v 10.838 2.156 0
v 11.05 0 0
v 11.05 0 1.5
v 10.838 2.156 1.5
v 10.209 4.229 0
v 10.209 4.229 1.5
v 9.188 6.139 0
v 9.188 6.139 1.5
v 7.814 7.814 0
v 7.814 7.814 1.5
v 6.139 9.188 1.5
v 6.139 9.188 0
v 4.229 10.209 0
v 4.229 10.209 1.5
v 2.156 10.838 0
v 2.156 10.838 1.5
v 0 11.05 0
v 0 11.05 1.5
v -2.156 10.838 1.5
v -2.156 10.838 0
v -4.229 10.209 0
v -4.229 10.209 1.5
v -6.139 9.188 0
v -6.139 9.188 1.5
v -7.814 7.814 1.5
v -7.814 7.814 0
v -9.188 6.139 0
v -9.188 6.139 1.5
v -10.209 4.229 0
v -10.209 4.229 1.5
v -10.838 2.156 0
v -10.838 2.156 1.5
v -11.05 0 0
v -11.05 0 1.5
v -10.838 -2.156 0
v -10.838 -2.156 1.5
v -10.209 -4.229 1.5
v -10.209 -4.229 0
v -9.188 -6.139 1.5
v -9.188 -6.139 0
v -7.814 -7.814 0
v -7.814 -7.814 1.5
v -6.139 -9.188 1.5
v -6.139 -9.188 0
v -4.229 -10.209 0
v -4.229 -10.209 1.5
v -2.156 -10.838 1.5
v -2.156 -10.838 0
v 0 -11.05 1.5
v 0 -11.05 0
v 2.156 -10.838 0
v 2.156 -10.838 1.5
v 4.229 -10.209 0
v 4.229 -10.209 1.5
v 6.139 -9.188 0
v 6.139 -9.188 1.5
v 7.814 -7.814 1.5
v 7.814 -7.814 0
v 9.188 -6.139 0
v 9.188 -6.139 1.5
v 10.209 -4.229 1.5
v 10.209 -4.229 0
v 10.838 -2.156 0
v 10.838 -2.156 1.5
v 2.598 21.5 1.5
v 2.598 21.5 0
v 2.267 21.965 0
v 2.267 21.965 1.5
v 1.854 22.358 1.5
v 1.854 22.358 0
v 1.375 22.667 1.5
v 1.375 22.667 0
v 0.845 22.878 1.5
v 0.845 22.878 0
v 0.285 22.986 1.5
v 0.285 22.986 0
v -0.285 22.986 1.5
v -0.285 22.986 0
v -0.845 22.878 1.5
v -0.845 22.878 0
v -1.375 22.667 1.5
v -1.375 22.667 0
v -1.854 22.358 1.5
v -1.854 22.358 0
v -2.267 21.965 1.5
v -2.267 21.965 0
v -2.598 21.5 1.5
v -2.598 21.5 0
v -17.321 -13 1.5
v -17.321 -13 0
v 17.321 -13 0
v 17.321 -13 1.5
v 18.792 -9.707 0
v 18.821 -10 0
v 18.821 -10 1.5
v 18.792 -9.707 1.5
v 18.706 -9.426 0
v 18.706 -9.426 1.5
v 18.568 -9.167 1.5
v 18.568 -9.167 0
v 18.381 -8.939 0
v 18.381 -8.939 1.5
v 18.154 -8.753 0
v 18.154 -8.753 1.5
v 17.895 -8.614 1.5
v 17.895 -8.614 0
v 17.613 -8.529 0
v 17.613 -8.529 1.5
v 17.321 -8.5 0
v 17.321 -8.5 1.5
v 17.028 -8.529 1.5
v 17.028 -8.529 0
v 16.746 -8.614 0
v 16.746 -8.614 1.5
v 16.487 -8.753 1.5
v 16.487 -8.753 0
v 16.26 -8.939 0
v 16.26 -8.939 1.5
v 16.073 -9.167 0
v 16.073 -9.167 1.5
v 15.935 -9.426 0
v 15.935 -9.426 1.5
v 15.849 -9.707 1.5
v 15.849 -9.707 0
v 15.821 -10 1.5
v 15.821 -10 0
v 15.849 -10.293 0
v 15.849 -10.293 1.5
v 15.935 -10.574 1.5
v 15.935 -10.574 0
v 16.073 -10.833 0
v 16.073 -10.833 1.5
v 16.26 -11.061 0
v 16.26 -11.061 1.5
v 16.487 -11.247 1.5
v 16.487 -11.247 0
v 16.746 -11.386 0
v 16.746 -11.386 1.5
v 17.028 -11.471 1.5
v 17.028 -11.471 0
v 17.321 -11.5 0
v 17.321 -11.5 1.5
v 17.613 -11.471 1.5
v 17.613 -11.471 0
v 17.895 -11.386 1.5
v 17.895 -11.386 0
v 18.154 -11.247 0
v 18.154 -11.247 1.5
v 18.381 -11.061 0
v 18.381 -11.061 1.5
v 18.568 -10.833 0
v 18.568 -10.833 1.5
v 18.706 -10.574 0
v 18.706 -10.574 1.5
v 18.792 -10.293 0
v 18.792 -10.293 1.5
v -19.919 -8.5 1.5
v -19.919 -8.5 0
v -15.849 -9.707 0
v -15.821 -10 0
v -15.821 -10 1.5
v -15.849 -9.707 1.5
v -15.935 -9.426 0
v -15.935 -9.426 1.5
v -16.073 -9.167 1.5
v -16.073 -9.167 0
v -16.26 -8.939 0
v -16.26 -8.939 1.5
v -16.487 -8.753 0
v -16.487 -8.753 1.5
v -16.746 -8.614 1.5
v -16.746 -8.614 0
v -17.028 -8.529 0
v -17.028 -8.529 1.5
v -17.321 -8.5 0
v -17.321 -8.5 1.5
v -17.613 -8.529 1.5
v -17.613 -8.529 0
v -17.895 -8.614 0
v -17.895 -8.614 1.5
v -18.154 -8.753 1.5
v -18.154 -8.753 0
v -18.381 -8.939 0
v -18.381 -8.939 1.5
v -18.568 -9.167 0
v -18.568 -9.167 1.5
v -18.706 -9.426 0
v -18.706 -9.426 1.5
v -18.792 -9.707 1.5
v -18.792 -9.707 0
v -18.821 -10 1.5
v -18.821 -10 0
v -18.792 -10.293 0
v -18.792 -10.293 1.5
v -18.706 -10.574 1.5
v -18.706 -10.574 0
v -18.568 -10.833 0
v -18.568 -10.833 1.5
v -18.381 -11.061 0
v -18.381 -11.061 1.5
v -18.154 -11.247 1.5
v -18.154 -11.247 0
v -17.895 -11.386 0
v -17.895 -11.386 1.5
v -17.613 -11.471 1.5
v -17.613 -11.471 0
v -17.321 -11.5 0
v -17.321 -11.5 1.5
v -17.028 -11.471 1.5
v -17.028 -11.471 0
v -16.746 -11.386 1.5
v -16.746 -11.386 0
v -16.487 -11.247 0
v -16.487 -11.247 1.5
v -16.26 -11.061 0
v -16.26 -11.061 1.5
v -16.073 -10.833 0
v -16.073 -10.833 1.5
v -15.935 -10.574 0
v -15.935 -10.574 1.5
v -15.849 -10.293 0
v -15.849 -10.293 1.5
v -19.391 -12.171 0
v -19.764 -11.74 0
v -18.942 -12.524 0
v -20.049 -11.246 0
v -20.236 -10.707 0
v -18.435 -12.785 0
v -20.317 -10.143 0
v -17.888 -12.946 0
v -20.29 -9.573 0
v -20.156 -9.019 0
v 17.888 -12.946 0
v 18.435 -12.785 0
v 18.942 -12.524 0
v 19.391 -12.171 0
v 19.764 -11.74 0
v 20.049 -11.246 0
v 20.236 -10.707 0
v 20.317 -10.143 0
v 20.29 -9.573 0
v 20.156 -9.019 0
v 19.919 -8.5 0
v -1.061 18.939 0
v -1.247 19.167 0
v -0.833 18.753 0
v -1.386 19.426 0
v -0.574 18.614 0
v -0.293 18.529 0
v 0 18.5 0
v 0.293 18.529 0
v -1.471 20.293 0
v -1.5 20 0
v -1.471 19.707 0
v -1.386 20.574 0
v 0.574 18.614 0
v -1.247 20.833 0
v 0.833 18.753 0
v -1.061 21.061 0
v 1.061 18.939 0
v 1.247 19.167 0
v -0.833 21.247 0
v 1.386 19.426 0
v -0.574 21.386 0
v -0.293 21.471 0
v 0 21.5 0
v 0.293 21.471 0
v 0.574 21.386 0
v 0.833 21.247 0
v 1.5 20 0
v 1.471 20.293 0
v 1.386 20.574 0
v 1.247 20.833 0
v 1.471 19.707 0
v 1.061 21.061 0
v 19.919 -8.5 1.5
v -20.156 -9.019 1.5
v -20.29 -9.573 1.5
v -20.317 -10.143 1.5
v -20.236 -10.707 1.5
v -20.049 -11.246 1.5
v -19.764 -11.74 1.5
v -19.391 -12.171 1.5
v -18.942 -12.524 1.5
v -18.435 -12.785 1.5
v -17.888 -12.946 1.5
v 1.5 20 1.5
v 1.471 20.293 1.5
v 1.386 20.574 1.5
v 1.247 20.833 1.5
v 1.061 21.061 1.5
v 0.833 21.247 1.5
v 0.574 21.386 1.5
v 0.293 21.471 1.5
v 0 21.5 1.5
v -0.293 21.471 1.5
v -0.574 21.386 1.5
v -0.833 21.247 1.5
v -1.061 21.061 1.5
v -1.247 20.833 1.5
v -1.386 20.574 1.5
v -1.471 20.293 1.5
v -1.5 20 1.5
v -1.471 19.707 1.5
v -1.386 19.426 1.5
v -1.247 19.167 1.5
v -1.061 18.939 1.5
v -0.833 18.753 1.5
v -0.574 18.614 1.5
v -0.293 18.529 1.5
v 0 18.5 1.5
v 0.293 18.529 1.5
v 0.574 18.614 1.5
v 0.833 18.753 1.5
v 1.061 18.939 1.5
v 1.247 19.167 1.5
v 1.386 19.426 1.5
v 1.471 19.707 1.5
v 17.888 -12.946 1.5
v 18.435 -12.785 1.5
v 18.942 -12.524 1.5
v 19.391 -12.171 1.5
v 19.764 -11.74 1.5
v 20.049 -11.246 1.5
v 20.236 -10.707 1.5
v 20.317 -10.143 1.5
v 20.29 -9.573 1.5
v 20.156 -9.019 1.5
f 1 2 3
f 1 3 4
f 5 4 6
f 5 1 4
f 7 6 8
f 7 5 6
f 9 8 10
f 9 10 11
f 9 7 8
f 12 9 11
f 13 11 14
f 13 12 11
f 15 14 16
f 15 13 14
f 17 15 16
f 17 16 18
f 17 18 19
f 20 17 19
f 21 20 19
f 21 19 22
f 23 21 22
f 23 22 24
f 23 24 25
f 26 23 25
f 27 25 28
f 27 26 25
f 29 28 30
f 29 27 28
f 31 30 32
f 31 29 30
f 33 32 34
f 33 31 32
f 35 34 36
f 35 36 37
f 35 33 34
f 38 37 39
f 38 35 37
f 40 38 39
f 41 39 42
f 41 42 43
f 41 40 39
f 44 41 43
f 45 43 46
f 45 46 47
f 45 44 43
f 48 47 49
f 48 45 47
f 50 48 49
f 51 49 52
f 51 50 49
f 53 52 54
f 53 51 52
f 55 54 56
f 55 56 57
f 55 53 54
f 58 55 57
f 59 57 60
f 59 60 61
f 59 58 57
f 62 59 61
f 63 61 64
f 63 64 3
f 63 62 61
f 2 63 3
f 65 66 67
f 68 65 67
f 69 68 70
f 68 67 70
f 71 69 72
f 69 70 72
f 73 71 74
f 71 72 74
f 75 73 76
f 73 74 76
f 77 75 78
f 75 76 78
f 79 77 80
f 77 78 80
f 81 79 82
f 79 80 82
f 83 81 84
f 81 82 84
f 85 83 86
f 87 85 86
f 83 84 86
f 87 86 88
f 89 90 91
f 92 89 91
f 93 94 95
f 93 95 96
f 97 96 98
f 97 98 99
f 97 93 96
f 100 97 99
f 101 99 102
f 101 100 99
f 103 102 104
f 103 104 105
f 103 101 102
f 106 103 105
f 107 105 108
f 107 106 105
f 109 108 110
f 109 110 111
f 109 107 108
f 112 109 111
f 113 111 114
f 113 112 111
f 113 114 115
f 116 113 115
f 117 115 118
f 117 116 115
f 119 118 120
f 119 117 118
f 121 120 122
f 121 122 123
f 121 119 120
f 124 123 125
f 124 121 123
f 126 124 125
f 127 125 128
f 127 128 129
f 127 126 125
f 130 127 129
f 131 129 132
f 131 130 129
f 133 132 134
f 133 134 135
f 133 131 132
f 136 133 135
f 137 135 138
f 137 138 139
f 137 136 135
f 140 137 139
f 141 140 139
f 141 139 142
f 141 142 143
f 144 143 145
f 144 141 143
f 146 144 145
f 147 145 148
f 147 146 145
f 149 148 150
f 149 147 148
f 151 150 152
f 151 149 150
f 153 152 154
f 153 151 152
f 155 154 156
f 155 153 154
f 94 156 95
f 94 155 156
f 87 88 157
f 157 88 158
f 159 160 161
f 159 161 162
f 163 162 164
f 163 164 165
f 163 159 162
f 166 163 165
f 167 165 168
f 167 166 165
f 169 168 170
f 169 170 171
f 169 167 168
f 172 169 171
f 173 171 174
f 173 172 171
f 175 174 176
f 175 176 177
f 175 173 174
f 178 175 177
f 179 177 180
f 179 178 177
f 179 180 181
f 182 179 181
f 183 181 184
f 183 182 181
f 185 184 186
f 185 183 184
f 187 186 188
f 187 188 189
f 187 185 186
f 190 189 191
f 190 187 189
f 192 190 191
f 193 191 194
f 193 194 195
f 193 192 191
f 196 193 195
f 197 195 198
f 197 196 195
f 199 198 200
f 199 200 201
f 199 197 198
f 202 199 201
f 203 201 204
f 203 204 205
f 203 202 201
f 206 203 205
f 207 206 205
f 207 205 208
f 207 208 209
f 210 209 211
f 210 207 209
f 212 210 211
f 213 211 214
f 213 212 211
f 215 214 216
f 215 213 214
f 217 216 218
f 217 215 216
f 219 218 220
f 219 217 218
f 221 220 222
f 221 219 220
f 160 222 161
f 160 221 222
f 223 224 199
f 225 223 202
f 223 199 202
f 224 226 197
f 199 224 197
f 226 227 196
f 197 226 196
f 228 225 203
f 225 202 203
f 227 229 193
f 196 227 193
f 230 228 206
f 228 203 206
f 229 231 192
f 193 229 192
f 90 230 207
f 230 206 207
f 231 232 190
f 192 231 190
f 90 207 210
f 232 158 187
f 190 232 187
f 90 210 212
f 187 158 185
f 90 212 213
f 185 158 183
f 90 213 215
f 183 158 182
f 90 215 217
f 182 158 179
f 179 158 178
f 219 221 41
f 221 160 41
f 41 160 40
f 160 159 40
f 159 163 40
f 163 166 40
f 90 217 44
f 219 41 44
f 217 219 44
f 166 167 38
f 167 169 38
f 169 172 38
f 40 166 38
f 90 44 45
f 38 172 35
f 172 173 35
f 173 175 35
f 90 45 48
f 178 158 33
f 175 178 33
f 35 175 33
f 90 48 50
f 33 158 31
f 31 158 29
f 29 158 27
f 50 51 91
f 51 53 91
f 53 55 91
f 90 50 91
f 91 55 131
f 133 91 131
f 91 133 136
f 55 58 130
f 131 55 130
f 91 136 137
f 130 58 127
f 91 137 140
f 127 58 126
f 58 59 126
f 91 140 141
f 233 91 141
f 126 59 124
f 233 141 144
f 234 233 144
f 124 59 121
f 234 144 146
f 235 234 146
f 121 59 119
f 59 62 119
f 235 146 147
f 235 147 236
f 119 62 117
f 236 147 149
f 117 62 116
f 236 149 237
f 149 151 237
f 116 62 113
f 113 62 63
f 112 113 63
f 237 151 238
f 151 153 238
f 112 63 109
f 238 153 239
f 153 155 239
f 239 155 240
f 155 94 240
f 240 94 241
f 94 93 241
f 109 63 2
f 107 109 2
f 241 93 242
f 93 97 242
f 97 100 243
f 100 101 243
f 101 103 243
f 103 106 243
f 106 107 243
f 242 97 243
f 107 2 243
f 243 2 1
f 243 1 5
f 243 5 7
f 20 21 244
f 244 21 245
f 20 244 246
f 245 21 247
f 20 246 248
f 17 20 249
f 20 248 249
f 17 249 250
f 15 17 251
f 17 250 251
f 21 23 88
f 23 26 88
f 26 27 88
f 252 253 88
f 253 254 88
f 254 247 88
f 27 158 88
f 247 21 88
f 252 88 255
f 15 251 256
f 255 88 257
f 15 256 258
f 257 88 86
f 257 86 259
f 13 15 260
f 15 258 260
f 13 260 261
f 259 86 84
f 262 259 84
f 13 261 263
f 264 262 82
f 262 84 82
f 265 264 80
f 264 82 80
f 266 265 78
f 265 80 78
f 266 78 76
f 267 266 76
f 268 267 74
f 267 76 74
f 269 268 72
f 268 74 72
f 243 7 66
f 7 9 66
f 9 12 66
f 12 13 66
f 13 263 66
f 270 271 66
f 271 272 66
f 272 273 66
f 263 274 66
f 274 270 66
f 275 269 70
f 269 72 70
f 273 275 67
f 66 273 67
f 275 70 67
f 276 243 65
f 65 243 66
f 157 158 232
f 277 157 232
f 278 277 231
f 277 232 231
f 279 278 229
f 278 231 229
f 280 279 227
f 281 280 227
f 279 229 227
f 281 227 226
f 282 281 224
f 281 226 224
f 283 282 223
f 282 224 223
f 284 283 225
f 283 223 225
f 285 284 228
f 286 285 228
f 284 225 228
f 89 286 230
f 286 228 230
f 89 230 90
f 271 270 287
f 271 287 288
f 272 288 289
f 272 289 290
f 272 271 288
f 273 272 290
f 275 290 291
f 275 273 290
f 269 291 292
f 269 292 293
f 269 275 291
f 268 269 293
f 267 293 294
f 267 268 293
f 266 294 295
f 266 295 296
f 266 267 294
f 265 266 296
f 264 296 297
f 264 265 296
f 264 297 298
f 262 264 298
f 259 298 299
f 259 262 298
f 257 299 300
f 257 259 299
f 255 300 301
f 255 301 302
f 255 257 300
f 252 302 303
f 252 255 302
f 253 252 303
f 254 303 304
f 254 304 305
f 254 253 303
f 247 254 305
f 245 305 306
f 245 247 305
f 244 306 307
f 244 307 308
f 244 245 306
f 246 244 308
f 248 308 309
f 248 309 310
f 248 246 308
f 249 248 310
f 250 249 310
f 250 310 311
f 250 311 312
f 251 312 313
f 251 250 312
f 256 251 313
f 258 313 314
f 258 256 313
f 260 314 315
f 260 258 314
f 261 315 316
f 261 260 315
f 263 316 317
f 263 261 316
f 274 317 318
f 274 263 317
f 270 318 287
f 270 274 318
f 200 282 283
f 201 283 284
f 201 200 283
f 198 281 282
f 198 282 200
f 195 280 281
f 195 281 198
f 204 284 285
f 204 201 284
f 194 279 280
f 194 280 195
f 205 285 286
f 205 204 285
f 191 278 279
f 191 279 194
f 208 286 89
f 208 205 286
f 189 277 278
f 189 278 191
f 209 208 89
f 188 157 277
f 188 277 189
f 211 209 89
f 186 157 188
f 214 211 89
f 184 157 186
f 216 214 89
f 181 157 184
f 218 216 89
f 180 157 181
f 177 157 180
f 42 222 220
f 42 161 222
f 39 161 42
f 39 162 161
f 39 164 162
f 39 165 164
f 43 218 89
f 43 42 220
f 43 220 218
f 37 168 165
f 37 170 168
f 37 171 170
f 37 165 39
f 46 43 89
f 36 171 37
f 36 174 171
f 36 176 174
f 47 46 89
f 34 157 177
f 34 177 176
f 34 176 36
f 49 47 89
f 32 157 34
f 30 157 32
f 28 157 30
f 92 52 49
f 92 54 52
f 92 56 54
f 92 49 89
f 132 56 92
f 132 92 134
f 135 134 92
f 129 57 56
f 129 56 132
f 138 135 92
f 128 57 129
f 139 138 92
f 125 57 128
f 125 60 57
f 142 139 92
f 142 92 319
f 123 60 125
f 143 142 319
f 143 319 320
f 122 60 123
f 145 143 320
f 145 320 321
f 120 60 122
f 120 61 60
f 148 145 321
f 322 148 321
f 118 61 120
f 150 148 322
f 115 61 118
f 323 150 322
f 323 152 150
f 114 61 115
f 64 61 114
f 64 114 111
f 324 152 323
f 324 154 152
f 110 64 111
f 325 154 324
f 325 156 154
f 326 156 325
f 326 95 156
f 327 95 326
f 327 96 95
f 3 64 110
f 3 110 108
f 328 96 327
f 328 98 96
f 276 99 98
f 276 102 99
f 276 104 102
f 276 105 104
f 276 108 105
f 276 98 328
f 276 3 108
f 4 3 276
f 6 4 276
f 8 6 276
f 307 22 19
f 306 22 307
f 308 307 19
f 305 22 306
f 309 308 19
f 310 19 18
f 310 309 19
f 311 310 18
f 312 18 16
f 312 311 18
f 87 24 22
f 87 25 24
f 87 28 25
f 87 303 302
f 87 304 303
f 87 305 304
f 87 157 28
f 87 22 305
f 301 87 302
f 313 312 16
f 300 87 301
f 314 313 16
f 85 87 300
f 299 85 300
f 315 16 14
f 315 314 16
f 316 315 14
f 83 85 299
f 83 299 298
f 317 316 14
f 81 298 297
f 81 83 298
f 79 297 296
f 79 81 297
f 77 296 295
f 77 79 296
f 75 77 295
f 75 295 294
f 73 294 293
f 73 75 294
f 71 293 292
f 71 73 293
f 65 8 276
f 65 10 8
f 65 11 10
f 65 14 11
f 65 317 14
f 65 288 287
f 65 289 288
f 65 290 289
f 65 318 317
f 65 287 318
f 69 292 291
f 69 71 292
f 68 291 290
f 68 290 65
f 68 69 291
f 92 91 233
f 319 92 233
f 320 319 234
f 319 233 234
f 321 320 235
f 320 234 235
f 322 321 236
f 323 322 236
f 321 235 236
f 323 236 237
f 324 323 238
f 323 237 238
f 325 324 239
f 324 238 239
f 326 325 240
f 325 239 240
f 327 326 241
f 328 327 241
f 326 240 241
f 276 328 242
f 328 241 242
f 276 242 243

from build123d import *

# Parameters (mm, degrees)
SKETCH_1_R      = 1.5
SKETCH_1_R_2    = 11.05
EXTRUDE_1_DEPTH = 1.5


with BuildPart() as part:
    # 草图1 → 凸台-拉伸1 (new body)
    with BuildSketch(Plane.XY):
        with BuildLine():
            Line((-2.598076211, 21.5), (-19.918584287, -8.5))
            ThreePointArc((-19.918584287, -8.5), (-19.918584287, -11.5), (-17.320508076, -13))
            Line((-17.320508076, -13), (17.320508076, -13))
            ThreePointArc((17.320508076, -13), (19.918584287, -11.5), (19.918584287, -8.5))
            Line((19.918584287, -8.5), (2.598076211, 21.5))
            ThreePointArc((2.598076211, 21.5), (0, 23), (-2.598076211, 21.5))
        make_face()
        with Locations((-17.320508076, -10)):
            Circle(SKETCH_1_R, mode=Mode.SUBTRACT)
        with Locations((0, 20)):
            Circle(SKETCH_1_R, mode=Mode.SUBTRACT)
        with Locations((17.320508076, -10)):
            Circle(SKETCH_1_R, mode=Mode.SUBTRACT)
        Circle(SKETCH_1_R_2, mode=Mode.SUBTRACT)
    extrude(amount=EXTRUDE_1_DEPTH)


solid = part.part
